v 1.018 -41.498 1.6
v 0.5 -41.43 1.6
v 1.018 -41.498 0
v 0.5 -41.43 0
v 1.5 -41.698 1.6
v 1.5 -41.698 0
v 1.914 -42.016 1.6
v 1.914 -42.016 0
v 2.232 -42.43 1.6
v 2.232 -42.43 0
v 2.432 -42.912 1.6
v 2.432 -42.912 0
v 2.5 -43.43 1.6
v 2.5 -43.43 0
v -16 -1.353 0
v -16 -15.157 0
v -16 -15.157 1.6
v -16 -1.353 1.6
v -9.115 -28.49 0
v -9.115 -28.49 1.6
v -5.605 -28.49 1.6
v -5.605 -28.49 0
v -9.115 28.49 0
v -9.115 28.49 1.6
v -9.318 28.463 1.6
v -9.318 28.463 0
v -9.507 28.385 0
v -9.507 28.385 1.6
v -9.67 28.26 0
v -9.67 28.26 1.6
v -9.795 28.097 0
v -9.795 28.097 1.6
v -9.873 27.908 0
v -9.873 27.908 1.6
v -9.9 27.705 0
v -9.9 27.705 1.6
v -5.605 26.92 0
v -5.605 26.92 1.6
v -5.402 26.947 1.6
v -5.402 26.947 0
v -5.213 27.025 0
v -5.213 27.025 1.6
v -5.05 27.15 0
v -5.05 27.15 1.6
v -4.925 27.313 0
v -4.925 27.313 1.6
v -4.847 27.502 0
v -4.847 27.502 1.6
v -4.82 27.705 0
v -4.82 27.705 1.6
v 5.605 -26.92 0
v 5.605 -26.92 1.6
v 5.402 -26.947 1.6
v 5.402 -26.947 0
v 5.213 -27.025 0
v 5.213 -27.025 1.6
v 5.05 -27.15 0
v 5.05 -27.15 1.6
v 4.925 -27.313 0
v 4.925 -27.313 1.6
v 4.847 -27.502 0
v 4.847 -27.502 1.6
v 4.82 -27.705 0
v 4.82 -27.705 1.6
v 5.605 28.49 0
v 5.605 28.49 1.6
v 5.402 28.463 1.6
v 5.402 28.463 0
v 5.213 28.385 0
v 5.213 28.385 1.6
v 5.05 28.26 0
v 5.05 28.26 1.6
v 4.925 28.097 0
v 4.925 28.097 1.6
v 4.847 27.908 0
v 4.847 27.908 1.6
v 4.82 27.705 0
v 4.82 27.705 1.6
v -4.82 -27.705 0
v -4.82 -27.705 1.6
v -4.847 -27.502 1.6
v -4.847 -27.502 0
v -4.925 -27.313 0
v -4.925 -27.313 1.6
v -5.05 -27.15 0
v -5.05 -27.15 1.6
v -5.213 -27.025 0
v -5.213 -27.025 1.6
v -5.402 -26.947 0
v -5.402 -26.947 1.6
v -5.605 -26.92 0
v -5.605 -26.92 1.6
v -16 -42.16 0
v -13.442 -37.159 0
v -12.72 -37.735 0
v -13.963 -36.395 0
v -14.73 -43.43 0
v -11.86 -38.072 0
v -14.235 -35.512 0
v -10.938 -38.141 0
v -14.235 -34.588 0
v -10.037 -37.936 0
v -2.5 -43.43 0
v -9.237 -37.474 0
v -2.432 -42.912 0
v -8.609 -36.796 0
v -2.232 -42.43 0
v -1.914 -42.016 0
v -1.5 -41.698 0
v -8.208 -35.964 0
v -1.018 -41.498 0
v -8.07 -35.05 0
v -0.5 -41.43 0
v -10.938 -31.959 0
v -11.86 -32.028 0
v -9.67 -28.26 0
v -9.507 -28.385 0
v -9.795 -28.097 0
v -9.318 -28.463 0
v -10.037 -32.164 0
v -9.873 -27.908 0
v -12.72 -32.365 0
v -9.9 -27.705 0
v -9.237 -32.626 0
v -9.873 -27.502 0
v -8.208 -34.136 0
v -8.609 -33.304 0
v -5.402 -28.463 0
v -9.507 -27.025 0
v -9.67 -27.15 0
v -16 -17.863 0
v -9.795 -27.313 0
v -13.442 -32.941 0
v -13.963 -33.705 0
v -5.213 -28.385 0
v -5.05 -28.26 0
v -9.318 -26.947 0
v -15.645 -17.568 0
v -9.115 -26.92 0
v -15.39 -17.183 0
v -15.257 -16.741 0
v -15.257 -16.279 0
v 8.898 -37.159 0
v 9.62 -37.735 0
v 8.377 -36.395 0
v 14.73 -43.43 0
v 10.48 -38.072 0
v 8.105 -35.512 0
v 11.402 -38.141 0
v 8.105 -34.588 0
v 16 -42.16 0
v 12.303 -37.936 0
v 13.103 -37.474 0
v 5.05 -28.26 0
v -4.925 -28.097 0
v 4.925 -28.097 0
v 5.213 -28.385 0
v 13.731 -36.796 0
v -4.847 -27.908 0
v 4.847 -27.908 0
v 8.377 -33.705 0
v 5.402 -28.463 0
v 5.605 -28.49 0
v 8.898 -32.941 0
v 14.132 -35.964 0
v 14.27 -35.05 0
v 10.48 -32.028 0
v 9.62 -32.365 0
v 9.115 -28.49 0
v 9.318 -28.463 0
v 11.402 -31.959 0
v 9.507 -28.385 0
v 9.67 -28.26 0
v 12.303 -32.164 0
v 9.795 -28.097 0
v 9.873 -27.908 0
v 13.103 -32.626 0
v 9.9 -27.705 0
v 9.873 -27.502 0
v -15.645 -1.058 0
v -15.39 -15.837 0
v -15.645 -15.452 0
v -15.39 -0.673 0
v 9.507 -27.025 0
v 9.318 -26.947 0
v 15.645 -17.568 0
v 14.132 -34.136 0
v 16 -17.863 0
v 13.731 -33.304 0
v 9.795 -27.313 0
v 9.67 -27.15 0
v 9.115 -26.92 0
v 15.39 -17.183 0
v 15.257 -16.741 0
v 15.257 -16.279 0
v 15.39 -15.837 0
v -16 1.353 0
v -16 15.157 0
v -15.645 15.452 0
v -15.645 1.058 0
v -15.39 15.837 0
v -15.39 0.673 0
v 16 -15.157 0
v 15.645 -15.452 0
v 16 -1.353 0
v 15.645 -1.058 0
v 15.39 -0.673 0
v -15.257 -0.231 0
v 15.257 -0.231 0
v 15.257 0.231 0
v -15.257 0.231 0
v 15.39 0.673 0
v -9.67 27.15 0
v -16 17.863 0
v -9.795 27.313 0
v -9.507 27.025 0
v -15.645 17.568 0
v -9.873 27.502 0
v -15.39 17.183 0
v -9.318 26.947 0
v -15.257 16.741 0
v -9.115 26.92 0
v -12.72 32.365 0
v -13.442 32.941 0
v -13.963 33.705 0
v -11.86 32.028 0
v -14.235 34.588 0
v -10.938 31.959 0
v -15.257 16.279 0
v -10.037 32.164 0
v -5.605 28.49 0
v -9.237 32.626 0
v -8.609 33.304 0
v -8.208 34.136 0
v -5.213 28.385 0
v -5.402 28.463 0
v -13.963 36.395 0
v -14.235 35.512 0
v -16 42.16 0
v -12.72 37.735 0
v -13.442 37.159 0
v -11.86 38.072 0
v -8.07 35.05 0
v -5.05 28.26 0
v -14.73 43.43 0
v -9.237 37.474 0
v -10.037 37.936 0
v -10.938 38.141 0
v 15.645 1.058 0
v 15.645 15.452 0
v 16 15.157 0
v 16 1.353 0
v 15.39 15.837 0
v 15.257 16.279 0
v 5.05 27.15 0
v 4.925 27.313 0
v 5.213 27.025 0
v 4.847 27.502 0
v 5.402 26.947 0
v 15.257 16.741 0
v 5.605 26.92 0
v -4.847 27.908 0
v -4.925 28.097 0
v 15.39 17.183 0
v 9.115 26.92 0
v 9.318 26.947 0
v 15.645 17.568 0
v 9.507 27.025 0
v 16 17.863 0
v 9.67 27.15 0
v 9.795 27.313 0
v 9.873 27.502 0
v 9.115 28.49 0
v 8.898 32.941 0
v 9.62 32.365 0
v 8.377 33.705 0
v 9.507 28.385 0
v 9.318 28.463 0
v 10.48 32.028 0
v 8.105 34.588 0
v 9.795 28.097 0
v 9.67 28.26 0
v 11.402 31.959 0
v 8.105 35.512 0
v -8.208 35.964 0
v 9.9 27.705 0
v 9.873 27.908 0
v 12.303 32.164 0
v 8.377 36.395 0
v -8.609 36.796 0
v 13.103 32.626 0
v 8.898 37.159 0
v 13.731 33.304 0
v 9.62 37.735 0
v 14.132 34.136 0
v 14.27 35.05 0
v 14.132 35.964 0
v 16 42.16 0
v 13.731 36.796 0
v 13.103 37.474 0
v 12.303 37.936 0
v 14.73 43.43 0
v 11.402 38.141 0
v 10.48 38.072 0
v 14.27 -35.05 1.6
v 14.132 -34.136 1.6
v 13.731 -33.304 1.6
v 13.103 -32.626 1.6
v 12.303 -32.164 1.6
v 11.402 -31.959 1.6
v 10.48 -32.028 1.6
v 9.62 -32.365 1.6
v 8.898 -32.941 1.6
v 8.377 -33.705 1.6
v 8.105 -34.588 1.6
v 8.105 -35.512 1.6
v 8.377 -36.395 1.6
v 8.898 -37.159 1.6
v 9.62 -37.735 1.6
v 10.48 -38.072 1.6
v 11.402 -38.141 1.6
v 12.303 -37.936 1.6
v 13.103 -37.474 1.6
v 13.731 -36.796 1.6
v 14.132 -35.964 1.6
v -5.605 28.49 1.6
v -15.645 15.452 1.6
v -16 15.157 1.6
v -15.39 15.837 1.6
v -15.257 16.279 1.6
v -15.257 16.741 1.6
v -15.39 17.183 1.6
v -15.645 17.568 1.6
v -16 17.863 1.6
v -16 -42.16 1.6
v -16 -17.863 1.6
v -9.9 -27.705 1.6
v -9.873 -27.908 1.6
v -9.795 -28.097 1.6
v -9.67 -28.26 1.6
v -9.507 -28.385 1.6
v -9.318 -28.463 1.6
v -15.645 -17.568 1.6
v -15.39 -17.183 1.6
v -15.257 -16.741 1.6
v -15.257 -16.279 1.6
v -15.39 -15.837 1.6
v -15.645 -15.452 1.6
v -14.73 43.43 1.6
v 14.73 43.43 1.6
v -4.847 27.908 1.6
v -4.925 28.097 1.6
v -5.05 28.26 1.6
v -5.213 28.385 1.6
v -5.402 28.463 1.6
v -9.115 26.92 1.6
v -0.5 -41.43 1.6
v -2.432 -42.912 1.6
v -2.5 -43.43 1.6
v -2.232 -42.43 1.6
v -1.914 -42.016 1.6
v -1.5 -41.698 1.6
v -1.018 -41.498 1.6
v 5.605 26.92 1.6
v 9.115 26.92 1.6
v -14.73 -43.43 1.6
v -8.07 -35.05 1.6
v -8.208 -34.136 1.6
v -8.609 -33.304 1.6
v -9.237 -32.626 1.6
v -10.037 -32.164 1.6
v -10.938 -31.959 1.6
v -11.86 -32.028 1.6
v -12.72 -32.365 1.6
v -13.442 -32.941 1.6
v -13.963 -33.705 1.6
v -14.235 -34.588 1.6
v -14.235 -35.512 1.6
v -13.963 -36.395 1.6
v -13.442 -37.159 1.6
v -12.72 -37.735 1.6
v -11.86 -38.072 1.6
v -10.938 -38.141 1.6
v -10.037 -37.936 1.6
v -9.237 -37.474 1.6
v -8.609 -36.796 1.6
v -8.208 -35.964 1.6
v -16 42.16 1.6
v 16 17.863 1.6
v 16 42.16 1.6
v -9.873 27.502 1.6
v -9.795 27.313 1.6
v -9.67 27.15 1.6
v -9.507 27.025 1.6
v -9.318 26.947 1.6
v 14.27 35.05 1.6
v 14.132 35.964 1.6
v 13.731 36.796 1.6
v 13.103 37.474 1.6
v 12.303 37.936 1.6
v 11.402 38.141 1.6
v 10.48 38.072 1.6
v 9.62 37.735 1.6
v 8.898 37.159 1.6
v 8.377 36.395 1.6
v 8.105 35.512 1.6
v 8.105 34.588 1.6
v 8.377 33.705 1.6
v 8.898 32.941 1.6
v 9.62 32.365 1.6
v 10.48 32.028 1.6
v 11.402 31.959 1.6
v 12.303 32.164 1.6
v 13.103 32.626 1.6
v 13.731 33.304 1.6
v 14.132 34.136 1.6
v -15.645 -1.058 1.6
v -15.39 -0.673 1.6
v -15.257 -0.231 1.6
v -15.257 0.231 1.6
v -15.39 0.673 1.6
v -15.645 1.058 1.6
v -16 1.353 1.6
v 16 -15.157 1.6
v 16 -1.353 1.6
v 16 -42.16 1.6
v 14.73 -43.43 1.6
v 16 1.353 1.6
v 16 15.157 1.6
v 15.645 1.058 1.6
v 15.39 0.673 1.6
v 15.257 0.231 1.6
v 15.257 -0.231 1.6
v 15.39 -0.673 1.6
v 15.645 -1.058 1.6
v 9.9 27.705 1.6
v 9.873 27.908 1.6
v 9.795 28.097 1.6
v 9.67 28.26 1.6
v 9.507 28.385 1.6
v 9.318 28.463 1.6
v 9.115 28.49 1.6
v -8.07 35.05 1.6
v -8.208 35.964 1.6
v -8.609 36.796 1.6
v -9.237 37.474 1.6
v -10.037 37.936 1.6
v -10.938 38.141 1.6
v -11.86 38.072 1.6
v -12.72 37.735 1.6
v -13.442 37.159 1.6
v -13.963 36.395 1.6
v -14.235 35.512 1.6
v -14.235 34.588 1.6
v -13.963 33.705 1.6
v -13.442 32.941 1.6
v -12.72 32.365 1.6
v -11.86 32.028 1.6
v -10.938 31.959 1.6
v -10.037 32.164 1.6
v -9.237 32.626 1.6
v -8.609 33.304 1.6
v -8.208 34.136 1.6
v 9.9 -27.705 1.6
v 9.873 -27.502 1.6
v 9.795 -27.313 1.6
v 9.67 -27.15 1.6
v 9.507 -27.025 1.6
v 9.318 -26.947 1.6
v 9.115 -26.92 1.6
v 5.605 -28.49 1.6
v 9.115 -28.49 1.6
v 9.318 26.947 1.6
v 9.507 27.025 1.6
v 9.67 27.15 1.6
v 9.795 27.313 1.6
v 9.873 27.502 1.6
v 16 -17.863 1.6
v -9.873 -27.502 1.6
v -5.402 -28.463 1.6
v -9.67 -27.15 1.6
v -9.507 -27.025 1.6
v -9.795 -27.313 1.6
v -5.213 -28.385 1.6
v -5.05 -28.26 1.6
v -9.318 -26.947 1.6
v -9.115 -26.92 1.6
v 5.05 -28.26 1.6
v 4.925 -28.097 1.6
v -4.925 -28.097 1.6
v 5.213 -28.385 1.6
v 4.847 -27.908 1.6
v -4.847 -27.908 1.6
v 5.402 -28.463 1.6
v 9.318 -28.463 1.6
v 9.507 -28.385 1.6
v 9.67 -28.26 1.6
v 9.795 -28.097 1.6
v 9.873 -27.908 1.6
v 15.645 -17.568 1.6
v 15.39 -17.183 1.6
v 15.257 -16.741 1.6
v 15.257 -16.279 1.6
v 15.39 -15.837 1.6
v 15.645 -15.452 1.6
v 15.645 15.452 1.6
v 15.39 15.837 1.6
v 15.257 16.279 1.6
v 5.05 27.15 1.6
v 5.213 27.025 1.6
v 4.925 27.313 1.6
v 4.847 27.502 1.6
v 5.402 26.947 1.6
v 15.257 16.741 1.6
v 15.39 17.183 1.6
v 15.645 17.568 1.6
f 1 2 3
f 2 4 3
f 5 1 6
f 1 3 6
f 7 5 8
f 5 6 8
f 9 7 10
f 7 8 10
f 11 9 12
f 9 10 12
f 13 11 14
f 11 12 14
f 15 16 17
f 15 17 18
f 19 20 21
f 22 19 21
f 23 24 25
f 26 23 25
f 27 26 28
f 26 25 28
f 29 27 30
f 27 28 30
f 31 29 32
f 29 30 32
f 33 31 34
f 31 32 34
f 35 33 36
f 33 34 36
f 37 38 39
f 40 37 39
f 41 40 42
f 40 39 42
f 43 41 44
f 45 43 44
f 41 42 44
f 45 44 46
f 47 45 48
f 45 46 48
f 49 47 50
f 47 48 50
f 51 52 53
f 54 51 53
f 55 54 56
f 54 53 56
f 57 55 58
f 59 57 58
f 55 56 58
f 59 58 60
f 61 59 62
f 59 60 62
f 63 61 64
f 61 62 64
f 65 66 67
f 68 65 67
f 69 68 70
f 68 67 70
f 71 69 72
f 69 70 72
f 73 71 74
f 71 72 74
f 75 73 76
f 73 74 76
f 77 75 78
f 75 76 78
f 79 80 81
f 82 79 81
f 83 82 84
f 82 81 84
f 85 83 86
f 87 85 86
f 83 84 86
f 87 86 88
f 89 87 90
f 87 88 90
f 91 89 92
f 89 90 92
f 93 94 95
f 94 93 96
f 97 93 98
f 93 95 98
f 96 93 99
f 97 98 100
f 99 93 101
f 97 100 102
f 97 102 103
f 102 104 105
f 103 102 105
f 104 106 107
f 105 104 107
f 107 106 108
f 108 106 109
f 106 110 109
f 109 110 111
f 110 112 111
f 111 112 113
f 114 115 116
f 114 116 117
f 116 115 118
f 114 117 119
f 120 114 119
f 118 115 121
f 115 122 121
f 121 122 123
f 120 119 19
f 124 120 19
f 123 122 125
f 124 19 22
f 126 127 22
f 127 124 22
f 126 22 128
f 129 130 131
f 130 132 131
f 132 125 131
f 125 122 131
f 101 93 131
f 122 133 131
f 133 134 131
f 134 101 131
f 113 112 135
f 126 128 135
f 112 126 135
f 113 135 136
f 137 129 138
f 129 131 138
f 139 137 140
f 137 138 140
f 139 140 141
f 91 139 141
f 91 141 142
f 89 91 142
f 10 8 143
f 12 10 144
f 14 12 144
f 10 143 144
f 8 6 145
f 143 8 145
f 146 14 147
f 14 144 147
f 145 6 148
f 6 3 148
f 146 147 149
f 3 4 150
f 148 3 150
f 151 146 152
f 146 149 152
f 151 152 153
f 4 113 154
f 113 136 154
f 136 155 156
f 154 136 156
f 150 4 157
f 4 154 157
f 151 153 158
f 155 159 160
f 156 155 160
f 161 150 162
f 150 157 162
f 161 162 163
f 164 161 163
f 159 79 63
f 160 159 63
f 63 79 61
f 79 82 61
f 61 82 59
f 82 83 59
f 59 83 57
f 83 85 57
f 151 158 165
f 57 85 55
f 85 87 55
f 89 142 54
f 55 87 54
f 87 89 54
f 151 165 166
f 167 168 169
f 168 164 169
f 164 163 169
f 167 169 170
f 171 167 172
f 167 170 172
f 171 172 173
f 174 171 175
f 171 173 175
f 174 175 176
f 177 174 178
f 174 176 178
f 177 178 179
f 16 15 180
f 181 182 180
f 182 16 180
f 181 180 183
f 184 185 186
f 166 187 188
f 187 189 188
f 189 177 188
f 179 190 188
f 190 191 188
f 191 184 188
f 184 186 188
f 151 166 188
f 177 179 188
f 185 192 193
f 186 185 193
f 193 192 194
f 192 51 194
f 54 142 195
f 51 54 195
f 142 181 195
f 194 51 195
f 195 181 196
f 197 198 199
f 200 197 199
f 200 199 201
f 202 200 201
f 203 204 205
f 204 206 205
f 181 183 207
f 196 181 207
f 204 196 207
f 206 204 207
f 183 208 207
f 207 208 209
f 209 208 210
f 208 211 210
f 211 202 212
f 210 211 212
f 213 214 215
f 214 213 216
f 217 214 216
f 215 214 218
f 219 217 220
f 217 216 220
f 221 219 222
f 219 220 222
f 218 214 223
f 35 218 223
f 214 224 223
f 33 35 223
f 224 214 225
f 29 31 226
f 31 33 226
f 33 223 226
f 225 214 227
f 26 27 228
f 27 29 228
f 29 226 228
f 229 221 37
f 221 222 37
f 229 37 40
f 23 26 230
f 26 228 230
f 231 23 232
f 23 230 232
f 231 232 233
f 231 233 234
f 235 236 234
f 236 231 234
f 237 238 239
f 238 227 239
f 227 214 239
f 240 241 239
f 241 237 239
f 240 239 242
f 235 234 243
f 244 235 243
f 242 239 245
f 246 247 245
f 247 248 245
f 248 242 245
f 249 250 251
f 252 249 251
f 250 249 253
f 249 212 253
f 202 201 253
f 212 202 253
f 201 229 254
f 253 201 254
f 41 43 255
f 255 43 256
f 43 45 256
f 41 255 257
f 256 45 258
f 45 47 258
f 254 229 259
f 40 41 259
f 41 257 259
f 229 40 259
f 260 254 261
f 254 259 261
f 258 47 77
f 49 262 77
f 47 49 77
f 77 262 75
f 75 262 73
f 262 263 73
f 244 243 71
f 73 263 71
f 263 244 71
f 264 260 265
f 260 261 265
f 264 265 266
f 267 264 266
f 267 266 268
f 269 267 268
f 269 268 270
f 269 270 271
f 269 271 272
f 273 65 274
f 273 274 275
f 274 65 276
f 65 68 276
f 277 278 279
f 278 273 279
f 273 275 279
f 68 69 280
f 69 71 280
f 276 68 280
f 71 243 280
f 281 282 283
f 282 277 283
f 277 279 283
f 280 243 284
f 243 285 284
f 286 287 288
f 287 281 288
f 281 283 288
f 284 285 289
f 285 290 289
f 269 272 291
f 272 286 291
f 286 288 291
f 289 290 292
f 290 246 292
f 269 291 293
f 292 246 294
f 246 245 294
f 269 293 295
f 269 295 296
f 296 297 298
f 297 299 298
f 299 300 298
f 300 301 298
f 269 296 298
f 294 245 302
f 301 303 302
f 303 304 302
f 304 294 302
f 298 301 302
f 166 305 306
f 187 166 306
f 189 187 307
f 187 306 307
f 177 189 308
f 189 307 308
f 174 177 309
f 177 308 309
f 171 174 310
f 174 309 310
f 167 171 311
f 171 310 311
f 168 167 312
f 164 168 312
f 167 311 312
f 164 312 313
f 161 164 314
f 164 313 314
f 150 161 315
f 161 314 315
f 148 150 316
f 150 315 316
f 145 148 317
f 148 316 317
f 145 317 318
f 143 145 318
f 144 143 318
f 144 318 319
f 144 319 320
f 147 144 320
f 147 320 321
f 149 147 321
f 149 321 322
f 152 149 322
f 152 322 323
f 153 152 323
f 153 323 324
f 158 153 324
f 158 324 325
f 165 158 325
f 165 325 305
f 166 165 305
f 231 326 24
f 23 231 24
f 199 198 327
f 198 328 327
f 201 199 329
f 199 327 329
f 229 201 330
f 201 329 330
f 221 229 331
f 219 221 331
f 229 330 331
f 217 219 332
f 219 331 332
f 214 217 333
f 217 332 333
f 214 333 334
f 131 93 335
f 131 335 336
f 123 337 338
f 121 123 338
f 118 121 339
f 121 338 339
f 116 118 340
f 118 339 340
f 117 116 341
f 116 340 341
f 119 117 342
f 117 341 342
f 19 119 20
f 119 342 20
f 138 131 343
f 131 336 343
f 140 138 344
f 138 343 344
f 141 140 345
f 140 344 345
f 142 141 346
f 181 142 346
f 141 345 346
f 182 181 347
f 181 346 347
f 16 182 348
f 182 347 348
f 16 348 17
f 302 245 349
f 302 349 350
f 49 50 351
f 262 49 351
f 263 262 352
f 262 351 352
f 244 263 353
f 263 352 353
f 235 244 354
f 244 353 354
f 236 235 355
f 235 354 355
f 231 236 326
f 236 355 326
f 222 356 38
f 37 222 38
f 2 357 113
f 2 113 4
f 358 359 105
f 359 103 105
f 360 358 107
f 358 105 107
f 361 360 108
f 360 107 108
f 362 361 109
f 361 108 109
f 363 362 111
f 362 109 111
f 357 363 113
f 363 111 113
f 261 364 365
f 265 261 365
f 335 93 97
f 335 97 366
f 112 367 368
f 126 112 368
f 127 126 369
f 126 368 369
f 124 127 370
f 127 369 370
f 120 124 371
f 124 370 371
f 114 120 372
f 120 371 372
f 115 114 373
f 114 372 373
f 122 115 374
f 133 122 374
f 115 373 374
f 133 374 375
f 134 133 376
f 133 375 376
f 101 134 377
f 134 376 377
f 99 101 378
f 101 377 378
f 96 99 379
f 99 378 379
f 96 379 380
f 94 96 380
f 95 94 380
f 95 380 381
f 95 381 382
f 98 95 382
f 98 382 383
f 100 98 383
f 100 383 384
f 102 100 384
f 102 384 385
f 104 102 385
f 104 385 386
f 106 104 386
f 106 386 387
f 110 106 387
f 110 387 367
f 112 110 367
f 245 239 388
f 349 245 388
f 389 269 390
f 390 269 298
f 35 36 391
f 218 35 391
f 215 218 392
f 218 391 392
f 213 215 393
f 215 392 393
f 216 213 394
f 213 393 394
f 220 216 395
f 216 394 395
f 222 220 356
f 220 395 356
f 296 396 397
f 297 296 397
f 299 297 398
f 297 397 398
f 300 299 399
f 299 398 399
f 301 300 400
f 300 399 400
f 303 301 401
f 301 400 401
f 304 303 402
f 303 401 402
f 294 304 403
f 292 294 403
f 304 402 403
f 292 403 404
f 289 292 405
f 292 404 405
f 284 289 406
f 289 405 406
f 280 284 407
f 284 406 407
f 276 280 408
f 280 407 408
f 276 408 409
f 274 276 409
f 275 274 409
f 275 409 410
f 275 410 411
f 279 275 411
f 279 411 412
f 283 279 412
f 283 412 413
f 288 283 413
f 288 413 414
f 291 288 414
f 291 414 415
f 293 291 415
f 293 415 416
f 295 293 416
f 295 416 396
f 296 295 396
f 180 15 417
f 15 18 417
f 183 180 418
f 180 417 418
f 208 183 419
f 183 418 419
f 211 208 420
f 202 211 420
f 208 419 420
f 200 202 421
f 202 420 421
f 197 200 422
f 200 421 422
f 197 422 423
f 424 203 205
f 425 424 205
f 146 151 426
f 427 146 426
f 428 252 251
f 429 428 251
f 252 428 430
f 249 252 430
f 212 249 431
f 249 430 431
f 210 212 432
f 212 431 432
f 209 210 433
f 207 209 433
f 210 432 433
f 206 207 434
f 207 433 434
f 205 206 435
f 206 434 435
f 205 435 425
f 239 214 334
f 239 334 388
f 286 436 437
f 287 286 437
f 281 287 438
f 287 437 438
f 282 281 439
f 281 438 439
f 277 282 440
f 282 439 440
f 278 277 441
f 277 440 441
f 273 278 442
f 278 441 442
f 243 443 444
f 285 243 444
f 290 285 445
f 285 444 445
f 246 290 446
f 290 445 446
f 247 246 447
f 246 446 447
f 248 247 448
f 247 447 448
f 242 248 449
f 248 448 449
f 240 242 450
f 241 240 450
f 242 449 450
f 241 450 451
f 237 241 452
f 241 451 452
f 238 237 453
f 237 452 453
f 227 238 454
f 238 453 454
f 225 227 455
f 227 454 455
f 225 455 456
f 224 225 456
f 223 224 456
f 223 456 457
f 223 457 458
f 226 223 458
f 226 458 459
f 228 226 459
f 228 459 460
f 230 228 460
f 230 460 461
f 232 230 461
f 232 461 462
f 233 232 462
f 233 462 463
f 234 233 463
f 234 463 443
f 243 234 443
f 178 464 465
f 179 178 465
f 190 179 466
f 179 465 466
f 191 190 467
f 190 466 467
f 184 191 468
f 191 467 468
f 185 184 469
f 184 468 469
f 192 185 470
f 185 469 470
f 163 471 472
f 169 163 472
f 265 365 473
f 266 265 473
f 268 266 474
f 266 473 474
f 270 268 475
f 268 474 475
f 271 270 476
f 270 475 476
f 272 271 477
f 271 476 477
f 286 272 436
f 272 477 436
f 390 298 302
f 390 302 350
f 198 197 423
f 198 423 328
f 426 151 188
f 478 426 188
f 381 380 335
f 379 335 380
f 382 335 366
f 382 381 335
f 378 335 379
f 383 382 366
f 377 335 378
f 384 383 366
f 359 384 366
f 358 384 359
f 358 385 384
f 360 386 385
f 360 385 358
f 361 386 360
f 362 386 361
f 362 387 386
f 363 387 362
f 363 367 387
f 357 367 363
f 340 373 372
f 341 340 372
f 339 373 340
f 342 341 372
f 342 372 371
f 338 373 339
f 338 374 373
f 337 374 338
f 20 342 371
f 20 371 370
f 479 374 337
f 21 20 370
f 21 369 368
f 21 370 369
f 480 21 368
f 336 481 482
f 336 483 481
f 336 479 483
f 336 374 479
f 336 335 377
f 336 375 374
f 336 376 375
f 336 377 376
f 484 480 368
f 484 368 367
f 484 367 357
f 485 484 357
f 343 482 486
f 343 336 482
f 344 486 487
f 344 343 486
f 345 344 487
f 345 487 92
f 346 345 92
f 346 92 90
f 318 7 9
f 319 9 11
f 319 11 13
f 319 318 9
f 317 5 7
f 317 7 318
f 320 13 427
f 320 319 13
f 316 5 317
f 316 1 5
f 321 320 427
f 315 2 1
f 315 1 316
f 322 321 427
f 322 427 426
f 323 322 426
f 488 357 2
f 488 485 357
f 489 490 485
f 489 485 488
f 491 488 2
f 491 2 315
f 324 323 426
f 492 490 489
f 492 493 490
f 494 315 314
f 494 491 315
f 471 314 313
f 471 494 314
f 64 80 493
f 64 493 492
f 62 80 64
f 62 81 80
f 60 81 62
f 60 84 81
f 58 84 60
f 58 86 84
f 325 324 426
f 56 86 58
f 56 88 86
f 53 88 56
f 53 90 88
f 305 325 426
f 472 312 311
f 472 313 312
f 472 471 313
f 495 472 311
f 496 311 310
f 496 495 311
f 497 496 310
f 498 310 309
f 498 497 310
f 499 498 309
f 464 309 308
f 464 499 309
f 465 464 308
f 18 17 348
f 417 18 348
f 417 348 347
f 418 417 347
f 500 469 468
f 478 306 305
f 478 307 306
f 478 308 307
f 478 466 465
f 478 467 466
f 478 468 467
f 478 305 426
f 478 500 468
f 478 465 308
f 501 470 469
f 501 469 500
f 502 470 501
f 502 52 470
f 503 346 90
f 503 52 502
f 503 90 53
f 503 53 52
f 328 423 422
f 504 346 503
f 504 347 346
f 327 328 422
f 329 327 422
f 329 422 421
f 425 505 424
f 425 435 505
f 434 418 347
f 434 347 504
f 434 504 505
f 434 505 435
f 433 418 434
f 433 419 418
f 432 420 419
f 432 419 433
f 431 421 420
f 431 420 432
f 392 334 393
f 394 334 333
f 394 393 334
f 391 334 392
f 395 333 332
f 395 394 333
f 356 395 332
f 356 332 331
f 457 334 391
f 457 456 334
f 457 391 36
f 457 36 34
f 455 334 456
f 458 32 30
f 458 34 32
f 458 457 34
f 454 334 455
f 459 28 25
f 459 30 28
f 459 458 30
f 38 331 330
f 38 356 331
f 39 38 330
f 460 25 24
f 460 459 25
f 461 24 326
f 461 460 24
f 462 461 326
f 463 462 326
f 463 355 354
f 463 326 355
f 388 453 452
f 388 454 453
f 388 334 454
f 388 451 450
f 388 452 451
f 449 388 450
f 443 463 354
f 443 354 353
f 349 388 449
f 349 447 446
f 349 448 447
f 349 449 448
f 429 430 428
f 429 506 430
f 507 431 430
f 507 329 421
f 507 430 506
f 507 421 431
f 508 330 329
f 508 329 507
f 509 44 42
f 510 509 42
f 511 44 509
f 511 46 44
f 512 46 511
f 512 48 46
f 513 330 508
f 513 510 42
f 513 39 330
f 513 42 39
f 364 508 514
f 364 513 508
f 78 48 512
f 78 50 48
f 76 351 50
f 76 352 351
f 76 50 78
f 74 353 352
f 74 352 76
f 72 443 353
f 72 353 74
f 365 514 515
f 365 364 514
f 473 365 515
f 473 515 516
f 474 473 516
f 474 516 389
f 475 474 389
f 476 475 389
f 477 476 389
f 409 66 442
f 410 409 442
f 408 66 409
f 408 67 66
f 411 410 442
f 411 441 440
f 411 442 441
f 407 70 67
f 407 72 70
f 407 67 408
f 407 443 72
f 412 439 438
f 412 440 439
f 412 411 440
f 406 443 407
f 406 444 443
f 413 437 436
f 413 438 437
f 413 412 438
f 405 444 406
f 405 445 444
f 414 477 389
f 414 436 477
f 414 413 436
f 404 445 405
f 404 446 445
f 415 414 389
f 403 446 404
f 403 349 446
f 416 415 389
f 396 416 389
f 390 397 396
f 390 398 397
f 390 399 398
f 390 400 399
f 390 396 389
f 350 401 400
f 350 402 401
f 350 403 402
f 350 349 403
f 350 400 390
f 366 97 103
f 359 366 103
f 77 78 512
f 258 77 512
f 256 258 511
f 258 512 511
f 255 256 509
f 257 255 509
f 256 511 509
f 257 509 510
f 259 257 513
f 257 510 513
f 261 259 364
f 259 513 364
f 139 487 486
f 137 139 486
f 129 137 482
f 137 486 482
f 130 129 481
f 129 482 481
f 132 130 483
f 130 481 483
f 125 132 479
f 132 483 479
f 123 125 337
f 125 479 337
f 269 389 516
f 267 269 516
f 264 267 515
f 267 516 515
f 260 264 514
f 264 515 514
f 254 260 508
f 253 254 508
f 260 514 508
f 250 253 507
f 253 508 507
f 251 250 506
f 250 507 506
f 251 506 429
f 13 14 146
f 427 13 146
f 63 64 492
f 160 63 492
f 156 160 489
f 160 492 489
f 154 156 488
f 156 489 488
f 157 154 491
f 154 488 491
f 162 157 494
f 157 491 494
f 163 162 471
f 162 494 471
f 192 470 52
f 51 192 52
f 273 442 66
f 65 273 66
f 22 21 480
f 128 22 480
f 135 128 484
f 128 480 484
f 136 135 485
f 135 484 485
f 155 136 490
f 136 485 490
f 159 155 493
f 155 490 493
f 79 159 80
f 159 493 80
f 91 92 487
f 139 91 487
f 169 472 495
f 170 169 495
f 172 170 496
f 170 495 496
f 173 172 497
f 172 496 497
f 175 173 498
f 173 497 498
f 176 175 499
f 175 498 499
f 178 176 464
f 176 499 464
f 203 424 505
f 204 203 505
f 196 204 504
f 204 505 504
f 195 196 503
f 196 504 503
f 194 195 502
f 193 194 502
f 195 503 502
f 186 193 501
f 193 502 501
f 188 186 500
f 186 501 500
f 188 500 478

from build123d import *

# Parameters (mm, degrees)
F0_W     = 32
F0_H     = 86.86
F1_DEPTH = 1.6
F2_R     = 3.1
F2_R_2   = 1.585
F2_W     = 5
F2_H     = 2.4618506432
F3_DEPTH = 25
F4_SIZE  = 1.27
F5_R     = 1.99999


# Not quite as in the source:
# - a fillet or chamfer is up to 0.001 mm smaller than in the source, because OpenCascade refuses the exact size


with BuildPart() as f1:
    # F0 (on Top) → F1 (new body)
    with BuildSketch(Plane.XY):
        Rectangle(F0_W, F0_H)
    extrude(amount=F1_DEPTH)

    # F2 (on face) → F3 (cut)
    with BuildSketch(Plane.XY.offset(1.6)):
        with Locations((-11.17, 35.05)):
            Circle(F2_R)
        with Locations((11.17, 35.05)):
            Circle(F2_R)
        with Locations((-11.17, -35.05)):
            Circle(F2_R)
        with Locations((11.17, -35.05)):
            Circle(F2_R)
        with BuildLine():
            Line((9.115, 28.49), (5.605, 28.49))
            ThreePointArc((5.605, 28.49), (5.0499211768, 28.2600788232), (4.82, 27.705))
            ThreePointArc((4.82, 27.705), (5.0499211768, 27.1499211768), (5.605, 26.92))
            Line((5.605, 26.92), (9.115, 26.92))
            ThreePointArc((9.115, 26.92), (9.6700788232, 27.1499211768), (9.9, 27.705))
            ThreePointArc((9.9, 27.705), (9.6700788232, 28.2600788232), (9.115, 28.49))
        make_face()
        with BuildLine():
            Line((-5.605, 28.49), (-9.115, 28.49))
            ThreePointArc((-9.115, 28.49), (-9.6700788232, 28.2600788232), (-9.9, 27.705))
            ThreePointArc((-9.9, 27.705), (-9.6700788232, 27.1499211768), (-9.115, 26.92))
            Line((-9.115, 26.92), (-5.605, 26.92))
            ThreePointArc((-5.605, 26.92), (-5.0499211768, 27.1499211768), (-4.82, 27.705))
            ThreePointArc((-4.82, 27.705), (-5.0499211768, 28.2600788232), (-5.605, 28.49))
        make_face()
        with Locations((16.825, 16.51)):
            Circle(F2_R_2)
        with Locations((16.825, 0)):
            Circle(F2_R_2)
        with Locations((16.825, -16.51)):
            Circle(F2_R_2)
        with Locations((-16.825, 0)):
            Circle(F2_R_2)
        with Locations((-16.825, 16.51)):
            Circle(F2_R_2)
        with Locations((-16.825, -16.51)):
            Circle(F2_R_2)
        with BuildLine():
            Line((-5.605, -26.92), (-9.115, -26.92))
            ThreePointArc((-9.115, -26.92), (-9.6700788232, -27.1499211768), (-9.9, -27.705))
            ThreePointArc((-9.9, -27.705), (-9.6700788232, -28.2600788232), (-9.115, -28.49))
            Line((-9.115, -28.49), (-5.605, -28.49))
            ThreePointArc((-5.605, -28.49), (-5.0499211768, -28.2600788232), (-4.82, -27.705))
            ThreePointArc((-4.82, -27.705), (-5.0499211768, -27.1499211768), (-5.605, -26.92))
        make_face()
        with BuildLine():
            Line((9.115, -26.92), (5.605, -26.92))
            ThreePointArc((5.605, -26.92), (5.0499211768, -27.1499211768), (4.82, -27.705))
            ThreePointArc((4.82, -27.705), (5.0499211768, -28.2600788232), (5.605, -28.49))
            Line((5.605, -28.49), (9.115, -28.49))
            ThreePointArc((9.115, -28.49), (9.6700788232, -28.2600788232), (9.9, -27.705))
            ThreePointArc((9.9, -27.705), (9.6700788232, -27.1499211768), (9.115, -26.92))
        make_face()
        with Locations((0, -42.6609253216)):
            Rectangle(F2_W, F2_H)
    extrude(amount=-F3_DEPTH, mode=Mode.SUBTRACT)

    # F4
    f4_edges = [f1.edges().sort_by_distance(p)[0] for p in [
        (16, 43.43, 0.8),
        (-16, 43.43, 0.8),
        (16, -43.43, 0.8),
        (-16, -43.43, 0.8),
    ]]
    chamfer(f4_edges, length=F4_SIZE)

    # F5 (radius 2 in the source; OpenCascade refuses exactly that, so slightly less here)
    f5_edges = [f1.edges().sort_by_distance(p)[0] for p in [
        (-2.5, -41.43, 0.8),
        (2.5, -41.43, 0.8),
    ]]
    fillet(f5_edges, radius=F5_R)


solid = f1.part
